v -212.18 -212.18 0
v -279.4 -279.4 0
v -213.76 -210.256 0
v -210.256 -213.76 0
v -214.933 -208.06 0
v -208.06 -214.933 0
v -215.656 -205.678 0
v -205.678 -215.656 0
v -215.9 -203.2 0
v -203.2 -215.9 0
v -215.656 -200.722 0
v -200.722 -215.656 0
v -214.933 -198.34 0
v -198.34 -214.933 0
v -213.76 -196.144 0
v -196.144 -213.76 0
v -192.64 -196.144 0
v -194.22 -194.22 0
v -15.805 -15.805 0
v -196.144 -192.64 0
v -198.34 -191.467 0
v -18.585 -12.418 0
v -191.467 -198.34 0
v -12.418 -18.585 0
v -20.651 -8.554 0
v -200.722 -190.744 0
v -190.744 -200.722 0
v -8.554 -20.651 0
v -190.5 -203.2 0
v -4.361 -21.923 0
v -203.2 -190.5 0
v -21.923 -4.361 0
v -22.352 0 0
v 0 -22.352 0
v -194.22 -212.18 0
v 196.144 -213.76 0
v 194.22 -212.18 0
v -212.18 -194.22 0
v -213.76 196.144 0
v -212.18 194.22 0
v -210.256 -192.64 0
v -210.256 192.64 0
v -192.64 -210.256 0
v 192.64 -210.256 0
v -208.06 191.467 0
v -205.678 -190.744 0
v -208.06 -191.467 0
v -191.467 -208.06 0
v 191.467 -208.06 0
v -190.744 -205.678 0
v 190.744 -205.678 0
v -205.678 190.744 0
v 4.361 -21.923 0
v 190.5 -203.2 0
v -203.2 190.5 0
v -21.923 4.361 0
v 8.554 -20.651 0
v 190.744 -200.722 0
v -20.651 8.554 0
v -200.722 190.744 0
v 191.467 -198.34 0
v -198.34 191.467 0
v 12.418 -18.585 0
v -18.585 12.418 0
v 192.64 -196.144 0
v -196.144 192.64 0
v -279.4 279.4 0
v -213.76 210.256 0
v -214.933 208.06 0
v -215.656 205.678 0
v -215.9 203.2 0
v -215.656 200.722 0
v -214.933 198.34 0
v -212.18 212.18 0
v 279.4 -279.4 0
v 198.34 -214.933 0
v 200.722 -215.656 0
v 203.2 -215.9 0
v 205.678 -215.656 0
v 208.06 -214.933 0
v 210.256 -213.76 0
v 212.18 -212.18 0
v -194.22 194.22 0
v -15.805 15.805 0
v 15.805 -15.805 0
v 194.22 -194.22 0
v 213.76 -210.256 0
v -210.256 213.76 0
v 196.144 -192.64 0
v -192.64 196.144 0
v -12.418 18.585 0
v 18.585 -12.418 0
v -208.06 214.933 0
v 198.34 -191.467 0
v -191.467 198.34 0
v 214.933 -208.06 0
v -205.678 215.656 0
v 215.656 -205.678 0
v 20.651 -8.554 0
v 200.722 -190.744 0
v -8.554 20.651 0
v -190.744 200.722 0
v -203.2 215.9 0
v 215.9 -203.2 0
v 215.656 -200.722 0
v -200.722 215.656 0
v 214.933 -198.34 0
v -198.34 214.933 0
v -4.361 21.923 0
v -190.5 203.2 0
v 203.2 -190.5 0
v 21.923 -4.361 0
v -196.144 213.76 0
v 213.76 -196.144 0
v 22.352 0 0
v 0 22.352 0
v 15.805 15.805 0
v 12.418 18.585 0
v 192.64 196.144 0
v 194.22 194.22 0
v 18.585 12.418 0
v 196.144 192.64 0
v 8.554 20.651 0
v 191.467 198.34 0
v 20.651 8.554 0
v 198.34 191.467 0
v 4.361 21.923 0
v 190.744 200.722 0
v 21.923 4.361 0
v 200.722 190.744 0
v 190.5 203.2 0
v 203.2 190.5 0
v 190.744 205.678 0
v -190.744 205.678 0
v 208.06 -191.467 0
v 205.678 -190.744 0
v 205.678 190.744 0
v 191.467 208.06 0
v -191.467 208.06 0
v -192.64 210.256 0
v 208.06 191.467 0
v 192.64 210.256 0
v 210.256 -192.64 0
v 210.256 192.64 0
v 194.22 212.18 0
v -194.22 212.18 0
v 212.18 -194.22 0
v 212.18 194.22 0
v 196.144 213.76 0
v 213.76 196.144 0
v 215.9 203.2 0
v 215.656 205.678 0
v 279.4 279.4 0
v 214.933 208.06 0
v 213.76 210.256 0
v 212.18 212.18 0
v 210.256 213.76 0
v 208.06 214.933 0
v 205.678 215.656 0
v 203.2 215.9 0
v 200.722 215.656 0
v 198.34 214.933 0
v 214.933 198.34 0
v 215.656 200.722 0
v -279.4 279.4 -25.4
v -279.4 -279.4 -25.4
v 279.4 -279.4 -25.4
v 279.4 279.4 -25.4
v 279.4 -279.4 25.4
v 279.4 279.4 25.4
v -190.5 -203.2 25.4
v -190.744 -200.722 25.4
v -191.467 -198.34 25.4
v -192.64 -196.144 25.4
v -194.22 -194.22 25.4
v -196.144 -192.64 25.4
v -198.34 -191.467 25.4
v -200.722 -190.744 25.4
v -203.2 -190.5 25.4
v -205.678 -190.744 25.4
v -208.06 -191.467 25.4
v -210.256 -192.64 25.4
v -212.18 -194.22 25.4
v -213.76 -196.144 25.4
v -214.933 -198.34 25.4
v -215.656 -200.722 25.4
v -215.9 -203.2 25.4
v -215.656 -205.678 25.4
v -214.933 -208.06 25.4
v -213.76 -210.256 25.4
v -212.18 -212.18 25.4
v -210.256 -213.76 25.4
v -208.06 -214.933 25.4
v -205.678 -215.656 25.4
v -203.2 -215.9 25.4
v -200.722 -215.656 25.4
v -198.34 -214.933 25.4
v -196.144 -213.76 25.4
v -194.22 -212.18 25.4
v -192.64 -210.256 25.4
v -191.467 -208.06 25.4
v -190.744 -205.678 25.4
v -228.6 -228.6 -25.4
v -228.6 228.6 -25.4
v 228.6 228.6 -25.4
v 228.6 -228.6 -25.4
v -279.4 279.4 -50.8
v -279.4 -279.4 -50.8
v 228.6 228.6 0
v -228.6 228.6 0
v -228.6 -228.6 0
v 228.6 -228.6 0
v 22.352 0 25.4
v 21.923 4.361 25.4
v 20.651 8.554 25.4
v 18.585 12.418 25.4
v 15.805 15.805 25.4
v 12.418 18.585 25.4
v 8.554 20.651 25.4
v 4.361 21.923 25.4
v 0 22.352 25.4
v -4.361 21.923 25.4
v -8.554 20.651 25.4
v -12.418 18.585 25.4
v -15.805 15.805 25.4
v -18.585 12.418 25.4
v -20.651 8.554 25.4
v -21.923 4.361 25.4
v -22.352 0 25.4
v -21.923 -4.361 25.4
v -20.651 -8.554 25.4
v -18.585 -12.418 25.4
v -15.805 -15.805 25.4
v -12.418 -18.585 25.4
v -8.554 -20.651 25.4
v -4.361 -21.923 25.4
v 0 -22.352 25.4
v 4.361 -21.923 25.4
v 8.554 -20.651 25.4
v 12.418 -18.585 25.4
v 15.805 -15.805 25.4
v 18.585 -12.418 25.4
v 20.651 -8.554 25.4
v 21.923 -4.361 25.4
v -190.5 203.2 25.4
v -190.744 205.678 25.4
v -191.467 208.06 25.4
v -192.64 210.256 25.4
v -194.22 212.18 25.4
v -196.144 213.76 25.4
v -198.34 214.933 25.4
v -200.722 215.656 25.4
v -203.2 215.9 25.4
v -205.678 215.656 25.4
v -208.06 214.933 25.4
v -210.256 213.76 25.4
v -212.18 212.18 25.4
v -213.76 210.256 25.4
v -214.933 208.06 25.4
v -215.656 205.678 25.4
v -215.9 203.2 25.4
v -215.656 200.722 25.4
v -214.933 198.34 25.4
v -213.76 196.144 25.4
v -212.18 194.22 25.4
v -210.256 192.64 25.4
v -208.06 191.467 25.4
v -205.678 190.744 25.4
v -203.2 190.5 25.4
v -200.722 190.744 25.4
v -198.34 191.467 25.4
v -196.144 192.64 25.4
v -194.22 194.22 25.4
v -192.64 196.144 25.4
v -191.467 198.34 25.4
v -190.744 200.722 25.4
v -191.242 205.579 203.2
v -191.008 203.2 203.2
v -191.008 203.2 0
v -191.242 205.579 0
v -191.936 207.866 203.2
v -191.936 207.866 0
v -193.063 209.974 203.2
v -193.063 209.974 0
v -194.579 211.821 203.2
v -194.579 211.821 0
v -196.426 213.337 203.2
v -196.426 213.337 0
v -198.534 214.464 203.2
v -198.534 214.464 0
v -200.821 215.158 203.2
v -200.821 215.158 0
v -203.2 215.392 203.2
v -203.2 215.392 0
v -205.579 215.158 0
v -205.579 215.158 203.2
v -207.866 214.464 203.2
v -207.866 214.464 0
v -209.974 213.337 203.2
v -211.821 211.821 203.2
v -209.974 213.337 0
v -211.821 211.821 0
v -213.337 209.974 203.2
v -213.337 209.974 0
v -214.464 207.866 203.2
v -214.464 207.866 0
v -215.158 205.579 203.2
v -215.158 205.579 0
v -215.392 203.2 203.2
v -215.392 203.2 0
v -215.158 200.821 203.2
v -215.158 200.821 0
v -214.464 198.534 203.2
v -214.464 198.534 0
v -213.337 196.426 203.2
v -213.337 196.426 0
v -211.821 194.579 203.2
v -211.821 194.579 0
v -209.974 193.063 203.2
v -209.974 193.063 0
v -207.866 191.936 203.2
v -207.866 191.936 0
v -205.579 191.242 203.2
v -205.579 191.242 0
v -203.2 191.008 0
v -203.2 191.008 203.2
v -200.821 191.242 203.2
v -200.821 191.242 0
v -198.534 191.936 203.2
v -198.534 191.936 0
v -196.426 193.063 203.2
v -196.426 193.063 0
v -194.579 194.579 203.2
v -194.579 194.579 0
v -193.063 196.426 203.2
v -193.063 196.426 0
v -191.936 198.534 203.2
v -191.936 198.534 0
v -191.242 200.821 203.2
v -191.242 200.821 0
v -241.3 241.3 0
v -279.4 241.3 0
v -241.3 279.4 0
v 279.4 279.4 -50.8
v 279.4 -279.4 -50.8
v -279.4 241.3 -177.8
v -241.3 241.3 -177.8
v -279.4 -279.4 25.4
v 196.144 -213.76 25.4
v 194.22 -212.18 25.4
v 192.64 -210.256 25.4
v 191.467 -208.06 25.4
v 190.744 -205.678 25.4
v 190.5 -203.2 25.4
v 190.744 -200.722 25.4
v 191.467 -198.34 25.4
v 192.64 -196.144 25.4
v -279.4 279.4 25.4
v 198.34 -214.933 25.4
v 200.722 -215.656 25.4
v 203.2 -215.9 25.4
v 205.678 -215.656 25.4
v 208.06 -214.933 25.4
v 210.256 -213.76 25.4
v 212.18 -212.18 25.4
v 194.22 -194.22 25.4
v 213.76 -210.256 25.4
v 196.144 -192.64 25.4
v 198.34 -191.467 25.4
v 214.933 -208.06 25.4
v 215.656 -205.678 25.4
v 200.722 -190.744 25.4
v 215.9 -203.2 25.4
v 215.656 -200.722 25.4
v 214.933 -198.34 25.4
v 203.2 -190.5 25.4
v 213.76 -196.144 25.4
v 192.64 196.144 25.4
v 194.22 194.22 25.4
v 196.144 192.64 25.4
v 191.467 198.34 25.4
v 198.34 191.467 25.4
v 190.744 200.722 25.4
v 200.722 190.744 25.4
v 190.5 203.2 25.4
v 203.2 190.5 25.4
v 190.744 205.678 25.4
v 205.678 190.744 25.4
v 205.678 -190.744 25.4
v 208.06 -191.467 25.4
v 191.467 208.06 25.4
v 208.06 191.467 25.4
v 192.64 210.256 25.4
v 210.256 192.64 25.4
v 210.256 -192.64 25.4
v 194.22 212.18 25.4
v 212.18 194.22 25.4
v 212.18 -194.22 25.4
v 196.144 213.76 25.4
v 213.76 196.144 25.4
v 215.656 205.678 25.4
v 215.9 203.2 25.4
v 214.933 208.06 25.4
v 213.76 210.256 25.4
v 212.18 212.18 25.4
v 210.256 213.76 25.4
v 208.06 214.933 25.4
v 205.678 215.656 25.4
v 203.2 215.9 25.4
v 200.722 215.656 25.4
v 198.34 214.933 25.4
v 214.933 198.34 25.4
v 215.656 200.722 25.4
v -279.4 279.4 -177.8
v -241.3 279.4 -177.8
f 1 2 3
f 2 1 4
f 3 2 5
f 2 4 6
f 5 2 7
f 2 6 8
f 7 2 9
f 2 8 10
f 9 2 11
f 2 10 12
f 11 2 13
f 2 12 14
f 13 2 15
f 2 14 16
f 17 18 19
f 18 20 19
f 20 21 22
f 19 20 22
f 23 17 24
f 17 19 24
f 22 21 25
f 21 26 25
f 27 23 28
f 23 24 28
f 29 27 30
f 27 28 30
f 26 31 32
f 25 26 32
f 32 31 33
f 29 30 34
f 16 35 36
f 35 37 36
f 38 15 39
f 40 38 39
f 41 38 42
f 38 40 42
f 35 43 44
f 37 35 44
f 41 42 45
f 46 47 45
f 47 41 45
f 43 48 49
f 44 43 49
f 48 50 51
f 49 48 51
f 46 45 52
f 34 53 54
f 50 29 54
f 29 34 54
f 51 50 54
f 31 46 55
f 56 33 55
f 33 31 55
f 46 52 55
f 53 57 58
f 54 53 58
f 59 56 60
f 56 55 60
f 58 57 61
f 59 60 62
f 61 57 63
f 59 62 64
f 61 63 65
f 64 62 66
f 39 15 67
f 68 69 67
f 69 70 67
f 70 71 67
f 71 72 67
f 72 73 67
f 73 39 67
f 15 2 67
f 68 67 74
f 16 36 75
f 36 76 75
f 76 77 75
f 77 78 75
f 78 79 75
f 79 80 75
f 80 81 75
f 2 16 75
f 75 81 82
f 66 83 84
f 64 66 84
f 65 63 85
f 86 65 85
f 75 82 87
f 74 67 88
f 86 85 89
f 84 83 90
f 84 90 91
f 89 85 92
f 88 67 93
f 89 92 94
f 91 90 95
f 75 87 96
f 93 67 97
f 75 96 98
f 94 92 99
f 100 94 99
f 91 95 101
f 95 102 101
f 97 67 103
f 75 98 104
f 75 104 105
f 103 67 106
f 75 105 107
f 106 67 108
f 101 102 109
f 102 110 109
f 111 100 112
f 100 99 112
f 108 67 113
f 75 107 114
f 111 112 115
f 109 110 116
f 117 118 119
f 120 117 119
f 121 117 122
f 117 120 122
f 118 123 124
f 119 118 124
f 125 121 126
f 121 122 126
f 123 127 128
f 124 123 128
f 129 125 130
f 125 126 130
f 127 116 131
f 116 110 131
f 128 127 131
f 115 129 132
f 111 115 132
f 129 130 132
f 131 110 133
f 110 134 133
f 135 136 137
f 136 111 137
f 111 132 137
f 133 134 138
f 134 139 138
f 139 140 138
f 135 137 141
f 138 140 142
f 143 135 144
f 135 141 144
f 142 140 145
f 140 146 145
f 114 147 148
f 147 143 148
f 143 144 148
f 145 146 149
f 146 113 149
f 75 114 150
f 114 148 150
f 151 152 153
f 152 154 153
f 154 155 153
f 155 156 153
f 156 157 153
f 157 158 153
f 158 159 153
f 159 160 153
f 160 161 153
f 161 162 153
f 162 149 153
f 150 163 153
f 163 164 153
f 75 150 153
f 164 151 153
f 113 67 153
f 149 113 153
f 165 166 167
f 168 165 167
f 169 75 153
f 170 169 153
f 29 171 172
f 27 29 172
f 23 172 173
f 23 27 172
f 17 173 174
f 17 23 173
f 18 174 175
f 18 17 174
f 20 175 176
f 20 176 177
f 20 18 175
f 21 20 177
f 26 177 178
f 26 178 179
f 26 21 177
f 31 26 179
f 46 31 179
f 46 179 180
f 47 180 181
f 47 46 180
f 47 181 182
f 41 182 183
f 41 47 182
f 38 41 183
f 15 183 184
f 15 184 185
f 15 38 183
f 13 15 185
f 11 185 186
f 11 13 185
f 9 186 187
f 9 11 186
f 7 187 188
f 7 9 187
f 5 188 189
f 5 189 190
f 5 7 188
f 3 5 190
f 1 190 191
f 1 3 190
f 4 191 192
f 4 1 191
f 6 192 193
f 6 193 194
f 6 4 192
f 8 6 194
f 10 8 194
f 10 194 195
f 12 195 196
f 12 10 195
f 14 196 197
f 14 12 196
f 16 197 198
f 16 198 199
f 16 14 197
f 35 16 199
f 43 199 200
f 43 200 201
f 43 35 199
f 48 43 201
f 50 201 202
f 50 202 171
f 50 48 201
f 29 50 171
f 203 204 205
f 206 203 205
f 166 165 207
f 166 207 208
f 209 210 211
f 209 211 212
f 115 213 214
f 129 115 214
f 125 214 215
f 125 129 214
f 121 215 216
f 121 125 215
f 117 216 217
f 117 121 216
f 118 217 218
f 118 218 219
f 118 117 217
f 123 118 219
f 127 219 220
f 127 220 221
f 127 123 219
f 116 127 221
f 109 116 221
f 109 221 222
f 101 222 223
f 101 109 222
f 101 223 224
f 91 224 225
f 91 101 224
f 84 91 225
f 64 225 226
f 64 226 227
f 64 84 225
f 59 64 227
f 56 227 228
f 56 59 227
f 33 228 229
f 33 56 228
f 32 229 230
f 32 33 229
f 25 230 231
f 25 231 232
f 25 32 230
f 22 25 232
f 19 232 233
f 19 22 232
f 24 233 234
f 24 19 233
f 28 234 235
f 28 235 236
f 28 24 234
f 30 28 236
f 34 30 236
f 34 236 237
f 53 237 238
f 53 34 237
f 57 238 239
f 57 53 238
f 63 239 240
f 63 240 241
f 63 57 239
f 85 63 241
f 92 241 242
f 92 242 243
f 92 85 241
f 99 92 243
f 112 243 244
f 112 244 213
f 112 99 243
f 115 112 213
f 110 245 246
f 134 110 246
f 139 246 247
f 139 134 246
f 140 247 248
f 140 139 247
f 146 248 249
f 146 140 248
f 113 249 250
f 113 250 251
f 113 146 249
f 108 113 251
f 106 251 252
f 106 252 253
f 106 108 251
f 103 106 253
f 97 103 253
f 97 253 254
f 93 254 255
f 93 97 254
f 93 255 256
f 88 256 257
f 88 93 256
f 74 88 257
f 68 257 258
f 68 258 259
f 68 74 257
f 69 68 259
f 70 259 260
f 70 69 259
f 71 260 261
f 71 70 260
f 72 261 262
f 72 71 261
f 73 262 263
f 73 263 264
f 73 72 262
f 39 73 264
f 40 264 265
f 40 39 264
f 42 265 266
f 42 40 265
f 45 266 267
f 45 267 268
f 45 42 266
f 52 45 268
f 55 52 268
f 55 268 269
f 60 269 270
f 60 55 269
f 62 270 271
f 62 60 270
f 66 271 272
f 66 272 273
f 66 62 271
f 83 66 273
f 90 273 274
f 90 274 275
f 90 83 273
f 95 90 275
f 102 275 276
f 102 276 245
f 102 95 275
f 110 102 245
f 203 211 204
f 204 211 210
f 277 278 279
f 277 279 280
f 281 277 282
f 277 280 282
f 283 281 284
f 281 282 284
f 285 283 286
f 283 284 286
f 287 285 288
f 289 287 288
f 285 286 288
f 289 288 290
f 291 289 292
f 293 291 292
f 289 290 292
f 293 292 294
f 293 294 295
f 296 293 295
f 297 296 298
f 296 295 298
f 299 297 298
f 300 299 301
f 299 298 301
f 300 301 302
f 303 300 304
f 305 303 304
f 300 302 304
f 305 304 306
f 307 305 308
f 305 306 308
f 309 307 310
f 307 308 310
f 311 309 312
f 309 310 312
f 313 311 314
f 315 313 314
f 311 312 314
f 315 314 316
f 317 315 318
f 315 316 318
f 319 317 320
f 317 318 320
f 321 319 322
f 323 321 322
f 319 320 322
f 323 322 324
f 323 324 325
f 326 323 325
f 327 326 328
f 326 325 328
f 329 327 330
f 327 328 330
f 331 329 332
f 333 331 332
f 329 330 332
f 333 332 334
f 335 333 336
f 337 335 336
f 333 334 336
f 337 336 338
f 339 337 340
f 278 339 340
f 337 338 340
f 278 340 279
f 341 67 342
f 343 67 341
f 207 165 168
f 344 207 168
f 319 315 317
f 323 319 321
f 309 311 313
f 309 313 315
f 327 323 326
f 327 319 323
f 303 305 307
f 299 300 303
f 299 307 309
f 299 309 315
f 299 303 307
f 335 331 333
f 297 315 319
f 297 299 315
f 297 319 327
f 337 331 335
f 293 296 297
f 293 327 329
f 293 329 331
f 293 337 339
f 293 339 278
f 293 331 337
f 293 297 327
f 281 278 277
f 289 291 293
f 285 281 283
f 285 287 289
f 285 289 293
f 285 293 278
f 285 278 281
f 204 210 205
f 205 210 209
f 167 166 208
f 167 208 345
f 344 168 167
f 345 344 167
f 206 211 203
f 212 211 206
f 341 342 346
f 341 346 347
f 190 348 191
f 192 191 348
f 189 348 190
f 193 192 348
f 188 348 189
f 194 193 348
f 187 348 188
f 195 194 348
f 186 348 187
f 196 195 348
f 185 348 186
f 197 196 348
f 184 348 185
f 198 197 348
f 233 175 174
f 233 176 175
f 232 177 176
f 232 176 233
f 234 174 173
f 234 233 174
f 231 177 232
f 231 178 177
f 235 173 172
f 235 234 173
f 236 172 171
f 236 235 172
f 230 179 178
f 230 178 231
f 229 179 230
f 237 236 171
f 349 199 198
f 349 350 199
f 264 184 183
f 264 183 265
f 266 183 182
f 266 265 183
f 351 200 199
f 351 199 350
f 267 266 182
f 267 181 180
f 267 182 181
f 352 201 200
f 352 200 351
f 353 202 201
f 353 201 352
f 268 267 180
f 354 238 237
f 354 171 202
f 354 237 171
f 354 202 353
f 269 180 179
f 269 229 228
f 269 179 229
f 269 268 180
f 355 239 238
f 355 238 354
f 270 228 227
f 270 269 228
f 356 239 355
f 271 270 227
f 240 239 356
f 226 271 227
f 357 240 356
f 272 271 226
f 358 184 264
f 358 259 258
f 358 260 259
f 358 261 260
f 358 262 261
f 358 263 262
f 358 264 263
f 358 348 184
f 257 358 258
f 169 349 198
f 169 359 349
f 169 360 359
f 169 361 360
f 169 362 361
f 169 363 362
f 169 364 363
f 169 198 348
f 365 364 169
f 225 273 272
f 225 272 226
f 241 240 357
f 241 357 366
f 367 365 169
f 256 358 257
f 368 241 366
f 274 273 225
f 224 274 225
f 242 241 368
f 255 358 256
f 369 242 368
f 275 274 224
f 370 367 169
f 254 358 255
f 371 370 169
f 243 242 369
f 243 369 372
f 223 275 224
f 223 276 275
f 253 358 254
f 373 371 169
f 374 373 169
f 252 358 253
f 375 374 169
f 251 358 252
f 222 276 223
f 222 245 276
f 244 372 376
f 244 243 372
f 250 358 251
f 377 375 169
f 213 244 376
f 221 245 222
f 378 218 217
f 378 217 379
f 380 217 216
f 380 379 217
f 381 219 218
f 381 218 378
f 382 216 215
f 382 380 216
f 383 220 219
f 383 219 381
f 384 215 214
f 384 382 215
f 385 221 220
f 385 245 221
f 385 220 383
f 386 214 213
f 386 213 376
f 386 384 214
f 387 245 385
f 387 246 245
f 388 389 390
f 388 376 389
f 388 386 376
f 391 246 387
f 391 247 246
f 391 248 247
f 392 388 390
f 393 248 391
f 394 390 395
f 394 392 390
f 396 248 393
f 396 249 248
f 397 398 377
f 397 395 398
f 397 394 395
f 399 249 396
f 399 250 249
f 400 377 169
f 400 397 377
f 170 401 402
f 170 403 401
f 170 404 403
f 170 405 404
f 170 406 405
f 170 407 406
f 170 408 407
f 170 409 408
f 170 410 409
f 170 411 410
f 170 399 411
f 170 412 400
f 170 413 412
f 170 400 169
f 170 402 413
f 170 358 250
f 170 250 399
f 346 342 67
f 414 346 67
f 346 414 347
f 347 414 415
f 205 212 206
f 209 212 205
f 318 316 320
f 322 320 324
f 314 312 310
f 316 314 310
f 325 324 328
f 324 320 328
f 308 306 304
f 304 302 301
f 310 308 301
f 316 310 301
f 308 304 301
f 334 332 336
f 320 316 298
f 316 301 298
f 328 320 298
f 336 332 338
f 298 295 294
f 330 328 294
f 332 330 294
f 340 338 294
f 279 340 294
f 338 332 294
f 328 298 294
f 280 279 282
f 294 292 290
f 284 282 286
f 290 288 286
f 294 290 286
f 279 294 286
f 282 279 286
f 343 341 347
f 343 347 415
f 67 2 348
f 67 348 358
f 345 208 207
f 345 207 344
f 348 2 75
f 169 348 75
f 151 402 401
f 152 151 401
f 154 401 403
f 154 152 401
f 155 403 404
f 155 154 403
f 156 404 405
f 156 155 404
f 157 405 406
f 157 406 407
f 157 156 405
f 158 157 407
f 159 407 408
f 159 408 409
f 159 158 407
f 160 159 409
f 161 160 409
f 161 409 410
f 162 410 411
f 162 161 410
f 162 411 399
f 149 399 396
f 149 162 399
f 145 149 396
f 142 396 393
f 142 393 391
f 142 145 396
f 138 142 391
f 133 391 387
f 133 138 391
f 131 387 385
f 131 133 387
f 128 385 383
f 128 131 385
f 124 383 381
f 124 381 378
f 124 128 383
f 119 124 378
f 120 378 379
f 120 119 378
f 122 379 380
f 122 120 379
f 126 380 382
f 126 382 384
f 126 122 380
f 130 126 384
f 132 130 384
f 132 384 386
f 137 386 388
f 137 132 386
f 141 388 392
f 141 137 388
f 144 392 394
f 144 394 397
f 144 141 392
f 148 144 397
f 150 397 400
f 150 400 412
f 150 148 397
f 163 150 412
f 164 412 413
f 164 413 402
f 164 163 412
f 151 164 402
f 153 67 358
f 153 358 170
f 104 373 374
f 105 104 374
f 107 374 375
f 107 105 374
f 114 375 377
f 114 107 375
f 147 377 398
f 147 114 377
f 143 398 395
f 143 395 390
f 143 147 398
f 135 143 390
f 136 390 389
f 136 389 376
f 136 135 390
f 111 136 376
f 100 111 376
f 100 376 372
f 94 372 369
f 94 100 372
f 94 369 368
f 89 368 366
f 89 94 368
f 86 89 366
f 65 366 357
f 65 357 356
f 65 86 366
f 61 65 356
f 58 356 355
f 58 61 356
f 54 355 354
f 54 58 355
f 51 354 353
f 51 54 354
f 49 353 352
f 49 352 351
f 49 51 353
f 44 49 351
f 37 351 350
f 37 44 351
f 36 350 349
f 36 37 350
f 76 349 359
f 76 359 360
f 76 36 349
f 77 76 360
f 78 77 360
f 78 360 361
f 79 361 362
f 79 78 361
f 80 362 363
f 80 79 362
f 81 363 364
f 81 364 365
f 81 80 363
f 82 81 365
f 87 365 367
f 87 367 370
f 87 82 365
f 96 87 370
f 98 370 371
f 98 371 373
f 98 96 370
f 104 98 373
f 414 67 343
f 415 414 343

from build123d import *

# Parameters (mm, degrees)
F0_W     = 558.8
F0_H     = 558.8
F0_R     = 12.7
F0_R_2   = 22.352
F1_DEPTH = 25.4
F2_W     = 457.2
F2_H     = 457.2
F3_DEPTH = 25.4
F4_W     = 38.1
F4_H     = 38.1
F5_DEPTH = 177.8
F6_W     = 558.8
F6_H     = 558.8
F7_DEPTH = 25.4
F8_R     = 12.192
F9_DEPTH = 203.2


with BuildPart() as f1:
    # F0 (on Top) → F1 (new body)
    with BuildSketch(Plane.XY):
        Rectangle(F0_W, F0_H)
        with Locations((-203.2, -203.2)):
            Circle(F0_R, mode=Mode.SUBTRACT)
        with Locations((203.2, -203.2)):
            Circle(F0_R, mode=Mode.SUBTRACT)
        with Locations((-203.2, 203.2)):
            Circle(F0_R, mode=Mode.SUBTRACT)
        Circle(F0_R_2, mode=Mode.SUBTRACT)
        with Locations((203.2, 203.2)):
            Circle(F0_R, mode=Mode.SUBTRACT)
    extrude(amount=F1_DEPTH)


with BuildPart() as f3:
    # F2 (on Top) → F3 (new body)
    with BuildSketch(Plane.XY):
        Rectangle(F2_W, F2_H)
    extrude(amount=-F3_DEPTH)


with BuildPart() as f5:
    # F4 (on Top) → F5 (new body)
    with BuildSketch(Plane.XY):
        with Locations((-260.35, 260.35)):
            Rectangle(F4_W, F4_H)
    extrude(amount=-F5_DEPTH)


with BuildPart() as f7:
    # F6 (on face) → F7 (new body)
    with BuildSketch(Plane(origin=(0, 0, -25.4), x_dir=(1, 0, 0), z_dir=(0, 0, -1))):
        Rectangle(F6_W, F6_H)
    extrude(amount=F7_DEPTH)


with BuildPart() as f9:
    # F8 (on face) → F9 (new body)
    with BuildSketch(Plane.XY):
        with Locations((-203.2, 203.2)):
            Circle(F8_R)
    extrude(amount=F9_DEPTH)


solid = Compound([f1.part, f3.part, f5.part, f7.part, f9.part])
